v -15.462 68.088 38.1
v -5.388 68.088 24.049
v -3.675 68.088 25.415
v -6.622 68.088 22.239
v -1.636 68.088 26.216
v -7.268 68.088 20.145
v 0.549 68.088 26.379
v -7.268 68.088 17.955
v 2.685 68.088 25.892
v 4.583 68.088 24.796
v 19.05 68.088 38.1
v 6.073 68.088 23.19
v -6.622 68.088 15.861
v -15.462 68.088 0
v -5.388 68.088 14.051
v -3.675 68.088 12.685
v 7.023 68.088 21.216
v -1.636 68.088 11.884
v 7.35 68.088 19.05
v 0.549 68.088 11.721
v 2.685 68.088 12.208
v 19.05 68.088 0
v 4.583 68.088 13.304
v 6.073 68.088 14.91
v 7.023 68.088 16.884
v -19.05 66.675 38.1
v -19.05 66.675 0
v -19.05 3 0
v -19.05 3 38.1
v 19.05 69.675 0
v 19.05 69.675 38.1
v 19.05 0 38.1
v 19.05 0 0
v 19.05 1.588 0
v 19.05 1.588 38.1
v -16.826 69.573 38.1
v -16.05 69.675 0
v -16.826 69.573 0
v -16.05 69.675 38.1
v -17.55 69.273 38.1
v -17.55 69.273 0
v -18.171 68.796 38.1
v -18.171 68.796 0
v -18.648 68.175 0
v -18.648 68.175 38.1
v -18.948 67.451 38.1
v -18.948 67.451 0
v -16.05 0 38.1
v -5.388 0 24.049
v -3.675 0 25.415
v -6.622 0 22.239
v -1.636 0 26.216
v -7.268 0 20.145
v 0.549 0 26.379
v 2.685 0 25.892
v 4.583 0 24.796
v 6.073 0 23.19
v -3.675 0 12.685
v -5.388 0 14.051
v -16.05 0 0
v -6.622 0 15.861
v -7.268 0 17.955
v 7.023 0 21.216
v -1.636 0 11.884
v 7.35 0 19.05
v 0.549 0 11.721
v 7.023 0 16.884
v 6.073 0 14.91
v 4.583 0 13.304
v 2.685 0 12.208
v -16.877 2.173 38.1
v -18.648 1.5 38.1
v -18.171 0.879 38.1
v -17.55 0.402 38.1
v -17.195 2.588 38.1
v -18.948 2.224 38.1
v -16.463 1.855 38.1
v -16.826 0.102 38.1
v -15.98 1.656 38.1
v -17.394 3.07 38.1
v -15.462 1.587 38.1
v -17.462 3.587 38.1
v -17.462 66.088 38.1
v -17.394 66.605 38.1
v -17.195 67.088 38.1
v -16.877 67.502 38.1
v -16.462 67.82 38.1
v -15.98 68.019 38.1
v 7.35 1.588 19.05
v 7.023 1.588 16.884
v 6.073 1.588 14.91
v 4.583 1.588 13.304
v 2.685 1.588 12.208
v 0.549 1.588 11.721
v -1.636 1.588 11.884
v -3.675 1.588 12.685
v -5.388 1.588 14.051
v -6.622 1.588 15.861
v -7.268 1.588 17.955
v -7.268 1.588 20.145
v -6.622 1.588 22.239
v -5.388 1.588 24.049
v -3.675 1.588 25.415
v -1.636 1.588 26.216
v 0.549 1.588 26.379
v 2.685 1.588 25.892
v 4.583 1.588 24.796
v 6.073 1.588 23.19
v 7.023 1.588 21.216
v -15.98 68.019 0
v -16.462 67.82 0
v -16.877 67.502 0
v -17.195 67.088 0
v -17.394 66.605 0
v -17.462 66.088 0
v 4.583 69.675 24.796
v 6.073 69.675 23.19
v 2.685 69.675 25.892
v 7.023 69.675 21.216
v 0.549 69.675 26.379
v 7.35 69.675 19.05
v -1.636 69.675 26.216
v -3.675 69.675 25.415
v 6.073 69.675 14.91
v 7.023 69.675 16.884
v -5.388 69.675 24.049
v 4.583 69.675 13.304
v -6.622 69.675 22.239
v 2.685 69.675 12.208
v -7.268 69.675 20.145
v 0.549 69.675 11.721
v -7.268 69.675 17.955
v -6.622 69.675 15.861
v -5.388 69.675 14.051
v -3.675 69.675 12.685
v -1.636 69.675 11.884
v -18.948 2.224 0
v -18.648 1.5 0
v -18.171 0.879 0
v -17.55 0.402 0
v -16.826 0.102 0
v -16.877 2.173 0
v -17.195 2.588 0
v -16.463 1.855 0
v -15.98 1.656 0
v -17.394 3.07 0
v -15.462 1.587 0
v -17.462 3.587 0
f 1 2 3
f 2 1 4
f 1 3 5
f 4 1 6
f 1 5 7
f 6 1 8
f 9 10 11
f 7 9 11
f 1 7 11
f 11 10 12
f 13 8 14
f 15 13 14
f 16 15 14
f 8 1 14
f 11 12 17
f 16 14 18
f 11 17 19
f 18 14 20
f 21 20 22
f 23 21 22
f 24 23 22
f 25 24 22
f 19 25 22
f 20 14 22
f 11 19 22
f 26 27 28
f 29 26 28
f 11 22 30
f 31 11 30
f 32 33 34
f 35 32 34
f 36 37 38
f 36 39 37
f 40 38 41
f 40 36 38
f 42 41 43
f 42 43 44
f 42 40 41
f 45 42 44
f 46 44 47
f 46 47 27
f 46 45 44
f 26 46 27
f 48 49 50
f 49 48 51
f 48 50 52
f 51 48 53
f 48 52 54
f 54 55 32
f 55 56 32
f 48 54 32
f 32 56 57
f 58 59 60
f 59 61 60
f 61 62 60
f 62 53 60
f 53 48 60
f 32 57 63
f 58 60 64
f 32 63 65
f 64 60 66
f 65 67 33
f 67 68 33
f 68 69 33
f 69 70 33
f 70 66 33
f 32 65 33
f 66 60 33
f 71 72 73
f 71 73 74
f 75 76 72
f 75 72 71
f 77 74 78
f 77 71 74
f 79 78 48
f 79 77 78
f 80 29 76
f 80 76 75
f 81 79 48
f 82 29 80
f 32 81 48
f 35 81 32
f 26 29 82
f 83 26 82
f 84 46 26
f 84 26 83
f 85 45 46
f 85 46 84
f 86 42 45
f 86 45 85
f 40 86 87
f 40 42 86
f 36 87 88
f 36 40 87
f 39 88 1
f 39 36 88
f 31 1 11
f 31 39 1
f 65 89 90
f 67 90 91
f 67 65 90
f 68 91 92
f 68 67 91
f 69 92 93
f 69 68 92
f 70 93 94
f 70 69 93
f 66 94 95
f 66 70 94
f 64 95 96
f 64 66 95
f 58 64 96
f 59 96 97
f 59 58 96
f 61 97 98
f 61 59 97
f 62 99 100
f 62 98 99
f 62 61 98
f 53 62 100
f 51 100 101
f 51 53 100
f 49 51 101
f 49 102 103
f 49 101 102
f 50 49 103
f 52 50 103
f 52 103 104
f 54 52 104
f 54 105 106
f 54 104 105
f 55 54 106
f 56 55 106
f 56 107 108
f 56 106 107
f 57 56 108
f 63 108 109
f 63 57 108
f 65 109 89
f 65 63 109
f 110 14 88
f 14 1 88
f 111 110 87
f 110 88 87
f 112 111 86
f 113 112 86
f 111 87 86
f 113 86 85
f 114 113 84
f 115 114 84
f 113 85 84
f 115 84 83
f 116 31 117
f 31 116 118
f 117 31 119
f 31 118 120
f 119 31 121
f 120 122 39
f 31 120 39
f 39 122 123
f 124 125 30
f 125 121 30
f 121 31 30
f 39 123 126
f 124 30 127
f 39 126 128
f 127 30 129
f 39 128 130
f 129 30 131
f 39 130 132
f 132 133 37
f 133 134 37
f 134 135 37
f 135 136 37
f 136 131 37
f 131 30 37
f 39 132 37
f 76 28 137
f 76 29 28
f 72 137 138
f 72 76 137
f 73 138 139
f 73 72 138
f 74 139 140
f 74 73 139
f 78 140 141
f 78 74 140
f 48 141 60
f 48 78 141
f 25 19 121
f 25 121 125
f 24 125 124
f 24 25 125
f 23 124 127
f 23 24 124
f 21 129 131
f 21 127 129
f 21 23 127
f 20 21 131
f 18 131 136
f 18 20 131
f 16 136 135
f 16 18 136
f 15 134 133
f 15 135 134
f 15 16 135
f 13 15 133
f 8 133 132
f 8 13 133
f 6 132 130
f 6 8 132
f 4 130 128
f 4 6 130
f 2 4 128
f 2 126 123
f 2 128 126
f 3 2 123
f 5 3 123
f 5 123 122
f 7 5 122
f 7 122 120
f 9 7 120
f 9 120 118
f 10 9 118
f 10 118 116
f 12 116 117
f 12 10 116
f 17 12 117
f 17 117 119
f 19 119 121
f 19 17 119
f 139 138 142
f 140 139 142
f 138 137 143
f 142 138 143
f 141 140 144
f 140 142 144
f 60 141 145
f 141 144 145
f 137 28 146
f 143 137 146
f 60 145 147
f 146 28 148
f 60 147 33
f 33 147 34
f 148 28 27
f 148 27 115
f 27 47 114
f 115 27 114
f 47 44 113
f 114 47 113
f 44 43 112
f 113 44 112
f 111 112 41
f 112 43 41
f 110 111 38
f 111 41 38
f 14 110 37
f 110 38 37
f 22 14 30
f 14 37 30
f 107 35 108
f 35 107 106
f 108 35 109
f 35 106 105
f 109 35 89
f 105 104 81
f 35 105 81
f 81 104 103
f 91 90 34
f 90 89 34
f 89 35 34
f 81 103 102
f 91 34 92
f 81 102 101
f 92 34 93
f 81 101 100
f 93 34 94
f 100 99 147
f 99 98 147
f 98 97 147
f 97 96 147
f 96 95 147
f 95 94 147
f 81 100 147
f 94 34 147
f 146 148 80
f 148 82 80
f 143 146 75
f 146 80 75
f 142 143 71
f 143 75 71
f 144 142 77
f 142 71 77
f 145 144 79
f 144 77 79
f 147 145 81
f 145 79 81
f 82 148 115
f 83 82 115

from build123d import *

# Parameters (mm, degrees)
BOSS_EXTRUDE1_DEPTH = 38.1
SKETCH3_R           = 7.35
CUT_EXTRUDE1_DEPTH  = 82.664668768
FILLET1_R           = 2
FILLET2_R           = 3


with BuildPart() as part:
    # Sketch1 → Boss-Extrude1 (new body)
    with BuildSketch(Plane.XY):
        Polygon((-17.4625, 68.0875), (19.05, 68.0875), (19.05, 69.675), (-19.05, 69.675), (-19.05, 0), (19.05, 0), (19.05, 1.5875), (-17.4625, 1.5875), align=None)
    extrude(amount=BOSS_EXTRUDE1_DEPTH)

    # Sketch3 → Cut-Extrude1 (cut, through all)
    with BuildSketch(Plane(origin=(0, 0, 0), x_dir=(1, 0, 0), z_dir=(0, 1, 0))):
        with Locations((0, -19.05)):
            Circle(SKETCH3_R)
    extrude(amount=CUT_EXTRUDE1_DEPTH, mode=Mode.SUBTRACT)

    # Fillet1
    fillet1_edges = [part.edges().sort_by_distance(p)[0] for p in [
        (-17.4625, 1.5875, 19.05),
        (-17.4625, 68.0875, 19.05),
    ]]
    fillet(fillet1_edges, radius=FILLET1_R)

    # Fillet2
    fillet2_edges = [part.edges().sort_by_distance(p)[0] for p in [
        (-19.05, 0, 19.05),
        (-19.05, 69.675, 19.05),
    ]]
    fillet(fillet2_edges, radius=FILLET2_R)


solid = part.part
